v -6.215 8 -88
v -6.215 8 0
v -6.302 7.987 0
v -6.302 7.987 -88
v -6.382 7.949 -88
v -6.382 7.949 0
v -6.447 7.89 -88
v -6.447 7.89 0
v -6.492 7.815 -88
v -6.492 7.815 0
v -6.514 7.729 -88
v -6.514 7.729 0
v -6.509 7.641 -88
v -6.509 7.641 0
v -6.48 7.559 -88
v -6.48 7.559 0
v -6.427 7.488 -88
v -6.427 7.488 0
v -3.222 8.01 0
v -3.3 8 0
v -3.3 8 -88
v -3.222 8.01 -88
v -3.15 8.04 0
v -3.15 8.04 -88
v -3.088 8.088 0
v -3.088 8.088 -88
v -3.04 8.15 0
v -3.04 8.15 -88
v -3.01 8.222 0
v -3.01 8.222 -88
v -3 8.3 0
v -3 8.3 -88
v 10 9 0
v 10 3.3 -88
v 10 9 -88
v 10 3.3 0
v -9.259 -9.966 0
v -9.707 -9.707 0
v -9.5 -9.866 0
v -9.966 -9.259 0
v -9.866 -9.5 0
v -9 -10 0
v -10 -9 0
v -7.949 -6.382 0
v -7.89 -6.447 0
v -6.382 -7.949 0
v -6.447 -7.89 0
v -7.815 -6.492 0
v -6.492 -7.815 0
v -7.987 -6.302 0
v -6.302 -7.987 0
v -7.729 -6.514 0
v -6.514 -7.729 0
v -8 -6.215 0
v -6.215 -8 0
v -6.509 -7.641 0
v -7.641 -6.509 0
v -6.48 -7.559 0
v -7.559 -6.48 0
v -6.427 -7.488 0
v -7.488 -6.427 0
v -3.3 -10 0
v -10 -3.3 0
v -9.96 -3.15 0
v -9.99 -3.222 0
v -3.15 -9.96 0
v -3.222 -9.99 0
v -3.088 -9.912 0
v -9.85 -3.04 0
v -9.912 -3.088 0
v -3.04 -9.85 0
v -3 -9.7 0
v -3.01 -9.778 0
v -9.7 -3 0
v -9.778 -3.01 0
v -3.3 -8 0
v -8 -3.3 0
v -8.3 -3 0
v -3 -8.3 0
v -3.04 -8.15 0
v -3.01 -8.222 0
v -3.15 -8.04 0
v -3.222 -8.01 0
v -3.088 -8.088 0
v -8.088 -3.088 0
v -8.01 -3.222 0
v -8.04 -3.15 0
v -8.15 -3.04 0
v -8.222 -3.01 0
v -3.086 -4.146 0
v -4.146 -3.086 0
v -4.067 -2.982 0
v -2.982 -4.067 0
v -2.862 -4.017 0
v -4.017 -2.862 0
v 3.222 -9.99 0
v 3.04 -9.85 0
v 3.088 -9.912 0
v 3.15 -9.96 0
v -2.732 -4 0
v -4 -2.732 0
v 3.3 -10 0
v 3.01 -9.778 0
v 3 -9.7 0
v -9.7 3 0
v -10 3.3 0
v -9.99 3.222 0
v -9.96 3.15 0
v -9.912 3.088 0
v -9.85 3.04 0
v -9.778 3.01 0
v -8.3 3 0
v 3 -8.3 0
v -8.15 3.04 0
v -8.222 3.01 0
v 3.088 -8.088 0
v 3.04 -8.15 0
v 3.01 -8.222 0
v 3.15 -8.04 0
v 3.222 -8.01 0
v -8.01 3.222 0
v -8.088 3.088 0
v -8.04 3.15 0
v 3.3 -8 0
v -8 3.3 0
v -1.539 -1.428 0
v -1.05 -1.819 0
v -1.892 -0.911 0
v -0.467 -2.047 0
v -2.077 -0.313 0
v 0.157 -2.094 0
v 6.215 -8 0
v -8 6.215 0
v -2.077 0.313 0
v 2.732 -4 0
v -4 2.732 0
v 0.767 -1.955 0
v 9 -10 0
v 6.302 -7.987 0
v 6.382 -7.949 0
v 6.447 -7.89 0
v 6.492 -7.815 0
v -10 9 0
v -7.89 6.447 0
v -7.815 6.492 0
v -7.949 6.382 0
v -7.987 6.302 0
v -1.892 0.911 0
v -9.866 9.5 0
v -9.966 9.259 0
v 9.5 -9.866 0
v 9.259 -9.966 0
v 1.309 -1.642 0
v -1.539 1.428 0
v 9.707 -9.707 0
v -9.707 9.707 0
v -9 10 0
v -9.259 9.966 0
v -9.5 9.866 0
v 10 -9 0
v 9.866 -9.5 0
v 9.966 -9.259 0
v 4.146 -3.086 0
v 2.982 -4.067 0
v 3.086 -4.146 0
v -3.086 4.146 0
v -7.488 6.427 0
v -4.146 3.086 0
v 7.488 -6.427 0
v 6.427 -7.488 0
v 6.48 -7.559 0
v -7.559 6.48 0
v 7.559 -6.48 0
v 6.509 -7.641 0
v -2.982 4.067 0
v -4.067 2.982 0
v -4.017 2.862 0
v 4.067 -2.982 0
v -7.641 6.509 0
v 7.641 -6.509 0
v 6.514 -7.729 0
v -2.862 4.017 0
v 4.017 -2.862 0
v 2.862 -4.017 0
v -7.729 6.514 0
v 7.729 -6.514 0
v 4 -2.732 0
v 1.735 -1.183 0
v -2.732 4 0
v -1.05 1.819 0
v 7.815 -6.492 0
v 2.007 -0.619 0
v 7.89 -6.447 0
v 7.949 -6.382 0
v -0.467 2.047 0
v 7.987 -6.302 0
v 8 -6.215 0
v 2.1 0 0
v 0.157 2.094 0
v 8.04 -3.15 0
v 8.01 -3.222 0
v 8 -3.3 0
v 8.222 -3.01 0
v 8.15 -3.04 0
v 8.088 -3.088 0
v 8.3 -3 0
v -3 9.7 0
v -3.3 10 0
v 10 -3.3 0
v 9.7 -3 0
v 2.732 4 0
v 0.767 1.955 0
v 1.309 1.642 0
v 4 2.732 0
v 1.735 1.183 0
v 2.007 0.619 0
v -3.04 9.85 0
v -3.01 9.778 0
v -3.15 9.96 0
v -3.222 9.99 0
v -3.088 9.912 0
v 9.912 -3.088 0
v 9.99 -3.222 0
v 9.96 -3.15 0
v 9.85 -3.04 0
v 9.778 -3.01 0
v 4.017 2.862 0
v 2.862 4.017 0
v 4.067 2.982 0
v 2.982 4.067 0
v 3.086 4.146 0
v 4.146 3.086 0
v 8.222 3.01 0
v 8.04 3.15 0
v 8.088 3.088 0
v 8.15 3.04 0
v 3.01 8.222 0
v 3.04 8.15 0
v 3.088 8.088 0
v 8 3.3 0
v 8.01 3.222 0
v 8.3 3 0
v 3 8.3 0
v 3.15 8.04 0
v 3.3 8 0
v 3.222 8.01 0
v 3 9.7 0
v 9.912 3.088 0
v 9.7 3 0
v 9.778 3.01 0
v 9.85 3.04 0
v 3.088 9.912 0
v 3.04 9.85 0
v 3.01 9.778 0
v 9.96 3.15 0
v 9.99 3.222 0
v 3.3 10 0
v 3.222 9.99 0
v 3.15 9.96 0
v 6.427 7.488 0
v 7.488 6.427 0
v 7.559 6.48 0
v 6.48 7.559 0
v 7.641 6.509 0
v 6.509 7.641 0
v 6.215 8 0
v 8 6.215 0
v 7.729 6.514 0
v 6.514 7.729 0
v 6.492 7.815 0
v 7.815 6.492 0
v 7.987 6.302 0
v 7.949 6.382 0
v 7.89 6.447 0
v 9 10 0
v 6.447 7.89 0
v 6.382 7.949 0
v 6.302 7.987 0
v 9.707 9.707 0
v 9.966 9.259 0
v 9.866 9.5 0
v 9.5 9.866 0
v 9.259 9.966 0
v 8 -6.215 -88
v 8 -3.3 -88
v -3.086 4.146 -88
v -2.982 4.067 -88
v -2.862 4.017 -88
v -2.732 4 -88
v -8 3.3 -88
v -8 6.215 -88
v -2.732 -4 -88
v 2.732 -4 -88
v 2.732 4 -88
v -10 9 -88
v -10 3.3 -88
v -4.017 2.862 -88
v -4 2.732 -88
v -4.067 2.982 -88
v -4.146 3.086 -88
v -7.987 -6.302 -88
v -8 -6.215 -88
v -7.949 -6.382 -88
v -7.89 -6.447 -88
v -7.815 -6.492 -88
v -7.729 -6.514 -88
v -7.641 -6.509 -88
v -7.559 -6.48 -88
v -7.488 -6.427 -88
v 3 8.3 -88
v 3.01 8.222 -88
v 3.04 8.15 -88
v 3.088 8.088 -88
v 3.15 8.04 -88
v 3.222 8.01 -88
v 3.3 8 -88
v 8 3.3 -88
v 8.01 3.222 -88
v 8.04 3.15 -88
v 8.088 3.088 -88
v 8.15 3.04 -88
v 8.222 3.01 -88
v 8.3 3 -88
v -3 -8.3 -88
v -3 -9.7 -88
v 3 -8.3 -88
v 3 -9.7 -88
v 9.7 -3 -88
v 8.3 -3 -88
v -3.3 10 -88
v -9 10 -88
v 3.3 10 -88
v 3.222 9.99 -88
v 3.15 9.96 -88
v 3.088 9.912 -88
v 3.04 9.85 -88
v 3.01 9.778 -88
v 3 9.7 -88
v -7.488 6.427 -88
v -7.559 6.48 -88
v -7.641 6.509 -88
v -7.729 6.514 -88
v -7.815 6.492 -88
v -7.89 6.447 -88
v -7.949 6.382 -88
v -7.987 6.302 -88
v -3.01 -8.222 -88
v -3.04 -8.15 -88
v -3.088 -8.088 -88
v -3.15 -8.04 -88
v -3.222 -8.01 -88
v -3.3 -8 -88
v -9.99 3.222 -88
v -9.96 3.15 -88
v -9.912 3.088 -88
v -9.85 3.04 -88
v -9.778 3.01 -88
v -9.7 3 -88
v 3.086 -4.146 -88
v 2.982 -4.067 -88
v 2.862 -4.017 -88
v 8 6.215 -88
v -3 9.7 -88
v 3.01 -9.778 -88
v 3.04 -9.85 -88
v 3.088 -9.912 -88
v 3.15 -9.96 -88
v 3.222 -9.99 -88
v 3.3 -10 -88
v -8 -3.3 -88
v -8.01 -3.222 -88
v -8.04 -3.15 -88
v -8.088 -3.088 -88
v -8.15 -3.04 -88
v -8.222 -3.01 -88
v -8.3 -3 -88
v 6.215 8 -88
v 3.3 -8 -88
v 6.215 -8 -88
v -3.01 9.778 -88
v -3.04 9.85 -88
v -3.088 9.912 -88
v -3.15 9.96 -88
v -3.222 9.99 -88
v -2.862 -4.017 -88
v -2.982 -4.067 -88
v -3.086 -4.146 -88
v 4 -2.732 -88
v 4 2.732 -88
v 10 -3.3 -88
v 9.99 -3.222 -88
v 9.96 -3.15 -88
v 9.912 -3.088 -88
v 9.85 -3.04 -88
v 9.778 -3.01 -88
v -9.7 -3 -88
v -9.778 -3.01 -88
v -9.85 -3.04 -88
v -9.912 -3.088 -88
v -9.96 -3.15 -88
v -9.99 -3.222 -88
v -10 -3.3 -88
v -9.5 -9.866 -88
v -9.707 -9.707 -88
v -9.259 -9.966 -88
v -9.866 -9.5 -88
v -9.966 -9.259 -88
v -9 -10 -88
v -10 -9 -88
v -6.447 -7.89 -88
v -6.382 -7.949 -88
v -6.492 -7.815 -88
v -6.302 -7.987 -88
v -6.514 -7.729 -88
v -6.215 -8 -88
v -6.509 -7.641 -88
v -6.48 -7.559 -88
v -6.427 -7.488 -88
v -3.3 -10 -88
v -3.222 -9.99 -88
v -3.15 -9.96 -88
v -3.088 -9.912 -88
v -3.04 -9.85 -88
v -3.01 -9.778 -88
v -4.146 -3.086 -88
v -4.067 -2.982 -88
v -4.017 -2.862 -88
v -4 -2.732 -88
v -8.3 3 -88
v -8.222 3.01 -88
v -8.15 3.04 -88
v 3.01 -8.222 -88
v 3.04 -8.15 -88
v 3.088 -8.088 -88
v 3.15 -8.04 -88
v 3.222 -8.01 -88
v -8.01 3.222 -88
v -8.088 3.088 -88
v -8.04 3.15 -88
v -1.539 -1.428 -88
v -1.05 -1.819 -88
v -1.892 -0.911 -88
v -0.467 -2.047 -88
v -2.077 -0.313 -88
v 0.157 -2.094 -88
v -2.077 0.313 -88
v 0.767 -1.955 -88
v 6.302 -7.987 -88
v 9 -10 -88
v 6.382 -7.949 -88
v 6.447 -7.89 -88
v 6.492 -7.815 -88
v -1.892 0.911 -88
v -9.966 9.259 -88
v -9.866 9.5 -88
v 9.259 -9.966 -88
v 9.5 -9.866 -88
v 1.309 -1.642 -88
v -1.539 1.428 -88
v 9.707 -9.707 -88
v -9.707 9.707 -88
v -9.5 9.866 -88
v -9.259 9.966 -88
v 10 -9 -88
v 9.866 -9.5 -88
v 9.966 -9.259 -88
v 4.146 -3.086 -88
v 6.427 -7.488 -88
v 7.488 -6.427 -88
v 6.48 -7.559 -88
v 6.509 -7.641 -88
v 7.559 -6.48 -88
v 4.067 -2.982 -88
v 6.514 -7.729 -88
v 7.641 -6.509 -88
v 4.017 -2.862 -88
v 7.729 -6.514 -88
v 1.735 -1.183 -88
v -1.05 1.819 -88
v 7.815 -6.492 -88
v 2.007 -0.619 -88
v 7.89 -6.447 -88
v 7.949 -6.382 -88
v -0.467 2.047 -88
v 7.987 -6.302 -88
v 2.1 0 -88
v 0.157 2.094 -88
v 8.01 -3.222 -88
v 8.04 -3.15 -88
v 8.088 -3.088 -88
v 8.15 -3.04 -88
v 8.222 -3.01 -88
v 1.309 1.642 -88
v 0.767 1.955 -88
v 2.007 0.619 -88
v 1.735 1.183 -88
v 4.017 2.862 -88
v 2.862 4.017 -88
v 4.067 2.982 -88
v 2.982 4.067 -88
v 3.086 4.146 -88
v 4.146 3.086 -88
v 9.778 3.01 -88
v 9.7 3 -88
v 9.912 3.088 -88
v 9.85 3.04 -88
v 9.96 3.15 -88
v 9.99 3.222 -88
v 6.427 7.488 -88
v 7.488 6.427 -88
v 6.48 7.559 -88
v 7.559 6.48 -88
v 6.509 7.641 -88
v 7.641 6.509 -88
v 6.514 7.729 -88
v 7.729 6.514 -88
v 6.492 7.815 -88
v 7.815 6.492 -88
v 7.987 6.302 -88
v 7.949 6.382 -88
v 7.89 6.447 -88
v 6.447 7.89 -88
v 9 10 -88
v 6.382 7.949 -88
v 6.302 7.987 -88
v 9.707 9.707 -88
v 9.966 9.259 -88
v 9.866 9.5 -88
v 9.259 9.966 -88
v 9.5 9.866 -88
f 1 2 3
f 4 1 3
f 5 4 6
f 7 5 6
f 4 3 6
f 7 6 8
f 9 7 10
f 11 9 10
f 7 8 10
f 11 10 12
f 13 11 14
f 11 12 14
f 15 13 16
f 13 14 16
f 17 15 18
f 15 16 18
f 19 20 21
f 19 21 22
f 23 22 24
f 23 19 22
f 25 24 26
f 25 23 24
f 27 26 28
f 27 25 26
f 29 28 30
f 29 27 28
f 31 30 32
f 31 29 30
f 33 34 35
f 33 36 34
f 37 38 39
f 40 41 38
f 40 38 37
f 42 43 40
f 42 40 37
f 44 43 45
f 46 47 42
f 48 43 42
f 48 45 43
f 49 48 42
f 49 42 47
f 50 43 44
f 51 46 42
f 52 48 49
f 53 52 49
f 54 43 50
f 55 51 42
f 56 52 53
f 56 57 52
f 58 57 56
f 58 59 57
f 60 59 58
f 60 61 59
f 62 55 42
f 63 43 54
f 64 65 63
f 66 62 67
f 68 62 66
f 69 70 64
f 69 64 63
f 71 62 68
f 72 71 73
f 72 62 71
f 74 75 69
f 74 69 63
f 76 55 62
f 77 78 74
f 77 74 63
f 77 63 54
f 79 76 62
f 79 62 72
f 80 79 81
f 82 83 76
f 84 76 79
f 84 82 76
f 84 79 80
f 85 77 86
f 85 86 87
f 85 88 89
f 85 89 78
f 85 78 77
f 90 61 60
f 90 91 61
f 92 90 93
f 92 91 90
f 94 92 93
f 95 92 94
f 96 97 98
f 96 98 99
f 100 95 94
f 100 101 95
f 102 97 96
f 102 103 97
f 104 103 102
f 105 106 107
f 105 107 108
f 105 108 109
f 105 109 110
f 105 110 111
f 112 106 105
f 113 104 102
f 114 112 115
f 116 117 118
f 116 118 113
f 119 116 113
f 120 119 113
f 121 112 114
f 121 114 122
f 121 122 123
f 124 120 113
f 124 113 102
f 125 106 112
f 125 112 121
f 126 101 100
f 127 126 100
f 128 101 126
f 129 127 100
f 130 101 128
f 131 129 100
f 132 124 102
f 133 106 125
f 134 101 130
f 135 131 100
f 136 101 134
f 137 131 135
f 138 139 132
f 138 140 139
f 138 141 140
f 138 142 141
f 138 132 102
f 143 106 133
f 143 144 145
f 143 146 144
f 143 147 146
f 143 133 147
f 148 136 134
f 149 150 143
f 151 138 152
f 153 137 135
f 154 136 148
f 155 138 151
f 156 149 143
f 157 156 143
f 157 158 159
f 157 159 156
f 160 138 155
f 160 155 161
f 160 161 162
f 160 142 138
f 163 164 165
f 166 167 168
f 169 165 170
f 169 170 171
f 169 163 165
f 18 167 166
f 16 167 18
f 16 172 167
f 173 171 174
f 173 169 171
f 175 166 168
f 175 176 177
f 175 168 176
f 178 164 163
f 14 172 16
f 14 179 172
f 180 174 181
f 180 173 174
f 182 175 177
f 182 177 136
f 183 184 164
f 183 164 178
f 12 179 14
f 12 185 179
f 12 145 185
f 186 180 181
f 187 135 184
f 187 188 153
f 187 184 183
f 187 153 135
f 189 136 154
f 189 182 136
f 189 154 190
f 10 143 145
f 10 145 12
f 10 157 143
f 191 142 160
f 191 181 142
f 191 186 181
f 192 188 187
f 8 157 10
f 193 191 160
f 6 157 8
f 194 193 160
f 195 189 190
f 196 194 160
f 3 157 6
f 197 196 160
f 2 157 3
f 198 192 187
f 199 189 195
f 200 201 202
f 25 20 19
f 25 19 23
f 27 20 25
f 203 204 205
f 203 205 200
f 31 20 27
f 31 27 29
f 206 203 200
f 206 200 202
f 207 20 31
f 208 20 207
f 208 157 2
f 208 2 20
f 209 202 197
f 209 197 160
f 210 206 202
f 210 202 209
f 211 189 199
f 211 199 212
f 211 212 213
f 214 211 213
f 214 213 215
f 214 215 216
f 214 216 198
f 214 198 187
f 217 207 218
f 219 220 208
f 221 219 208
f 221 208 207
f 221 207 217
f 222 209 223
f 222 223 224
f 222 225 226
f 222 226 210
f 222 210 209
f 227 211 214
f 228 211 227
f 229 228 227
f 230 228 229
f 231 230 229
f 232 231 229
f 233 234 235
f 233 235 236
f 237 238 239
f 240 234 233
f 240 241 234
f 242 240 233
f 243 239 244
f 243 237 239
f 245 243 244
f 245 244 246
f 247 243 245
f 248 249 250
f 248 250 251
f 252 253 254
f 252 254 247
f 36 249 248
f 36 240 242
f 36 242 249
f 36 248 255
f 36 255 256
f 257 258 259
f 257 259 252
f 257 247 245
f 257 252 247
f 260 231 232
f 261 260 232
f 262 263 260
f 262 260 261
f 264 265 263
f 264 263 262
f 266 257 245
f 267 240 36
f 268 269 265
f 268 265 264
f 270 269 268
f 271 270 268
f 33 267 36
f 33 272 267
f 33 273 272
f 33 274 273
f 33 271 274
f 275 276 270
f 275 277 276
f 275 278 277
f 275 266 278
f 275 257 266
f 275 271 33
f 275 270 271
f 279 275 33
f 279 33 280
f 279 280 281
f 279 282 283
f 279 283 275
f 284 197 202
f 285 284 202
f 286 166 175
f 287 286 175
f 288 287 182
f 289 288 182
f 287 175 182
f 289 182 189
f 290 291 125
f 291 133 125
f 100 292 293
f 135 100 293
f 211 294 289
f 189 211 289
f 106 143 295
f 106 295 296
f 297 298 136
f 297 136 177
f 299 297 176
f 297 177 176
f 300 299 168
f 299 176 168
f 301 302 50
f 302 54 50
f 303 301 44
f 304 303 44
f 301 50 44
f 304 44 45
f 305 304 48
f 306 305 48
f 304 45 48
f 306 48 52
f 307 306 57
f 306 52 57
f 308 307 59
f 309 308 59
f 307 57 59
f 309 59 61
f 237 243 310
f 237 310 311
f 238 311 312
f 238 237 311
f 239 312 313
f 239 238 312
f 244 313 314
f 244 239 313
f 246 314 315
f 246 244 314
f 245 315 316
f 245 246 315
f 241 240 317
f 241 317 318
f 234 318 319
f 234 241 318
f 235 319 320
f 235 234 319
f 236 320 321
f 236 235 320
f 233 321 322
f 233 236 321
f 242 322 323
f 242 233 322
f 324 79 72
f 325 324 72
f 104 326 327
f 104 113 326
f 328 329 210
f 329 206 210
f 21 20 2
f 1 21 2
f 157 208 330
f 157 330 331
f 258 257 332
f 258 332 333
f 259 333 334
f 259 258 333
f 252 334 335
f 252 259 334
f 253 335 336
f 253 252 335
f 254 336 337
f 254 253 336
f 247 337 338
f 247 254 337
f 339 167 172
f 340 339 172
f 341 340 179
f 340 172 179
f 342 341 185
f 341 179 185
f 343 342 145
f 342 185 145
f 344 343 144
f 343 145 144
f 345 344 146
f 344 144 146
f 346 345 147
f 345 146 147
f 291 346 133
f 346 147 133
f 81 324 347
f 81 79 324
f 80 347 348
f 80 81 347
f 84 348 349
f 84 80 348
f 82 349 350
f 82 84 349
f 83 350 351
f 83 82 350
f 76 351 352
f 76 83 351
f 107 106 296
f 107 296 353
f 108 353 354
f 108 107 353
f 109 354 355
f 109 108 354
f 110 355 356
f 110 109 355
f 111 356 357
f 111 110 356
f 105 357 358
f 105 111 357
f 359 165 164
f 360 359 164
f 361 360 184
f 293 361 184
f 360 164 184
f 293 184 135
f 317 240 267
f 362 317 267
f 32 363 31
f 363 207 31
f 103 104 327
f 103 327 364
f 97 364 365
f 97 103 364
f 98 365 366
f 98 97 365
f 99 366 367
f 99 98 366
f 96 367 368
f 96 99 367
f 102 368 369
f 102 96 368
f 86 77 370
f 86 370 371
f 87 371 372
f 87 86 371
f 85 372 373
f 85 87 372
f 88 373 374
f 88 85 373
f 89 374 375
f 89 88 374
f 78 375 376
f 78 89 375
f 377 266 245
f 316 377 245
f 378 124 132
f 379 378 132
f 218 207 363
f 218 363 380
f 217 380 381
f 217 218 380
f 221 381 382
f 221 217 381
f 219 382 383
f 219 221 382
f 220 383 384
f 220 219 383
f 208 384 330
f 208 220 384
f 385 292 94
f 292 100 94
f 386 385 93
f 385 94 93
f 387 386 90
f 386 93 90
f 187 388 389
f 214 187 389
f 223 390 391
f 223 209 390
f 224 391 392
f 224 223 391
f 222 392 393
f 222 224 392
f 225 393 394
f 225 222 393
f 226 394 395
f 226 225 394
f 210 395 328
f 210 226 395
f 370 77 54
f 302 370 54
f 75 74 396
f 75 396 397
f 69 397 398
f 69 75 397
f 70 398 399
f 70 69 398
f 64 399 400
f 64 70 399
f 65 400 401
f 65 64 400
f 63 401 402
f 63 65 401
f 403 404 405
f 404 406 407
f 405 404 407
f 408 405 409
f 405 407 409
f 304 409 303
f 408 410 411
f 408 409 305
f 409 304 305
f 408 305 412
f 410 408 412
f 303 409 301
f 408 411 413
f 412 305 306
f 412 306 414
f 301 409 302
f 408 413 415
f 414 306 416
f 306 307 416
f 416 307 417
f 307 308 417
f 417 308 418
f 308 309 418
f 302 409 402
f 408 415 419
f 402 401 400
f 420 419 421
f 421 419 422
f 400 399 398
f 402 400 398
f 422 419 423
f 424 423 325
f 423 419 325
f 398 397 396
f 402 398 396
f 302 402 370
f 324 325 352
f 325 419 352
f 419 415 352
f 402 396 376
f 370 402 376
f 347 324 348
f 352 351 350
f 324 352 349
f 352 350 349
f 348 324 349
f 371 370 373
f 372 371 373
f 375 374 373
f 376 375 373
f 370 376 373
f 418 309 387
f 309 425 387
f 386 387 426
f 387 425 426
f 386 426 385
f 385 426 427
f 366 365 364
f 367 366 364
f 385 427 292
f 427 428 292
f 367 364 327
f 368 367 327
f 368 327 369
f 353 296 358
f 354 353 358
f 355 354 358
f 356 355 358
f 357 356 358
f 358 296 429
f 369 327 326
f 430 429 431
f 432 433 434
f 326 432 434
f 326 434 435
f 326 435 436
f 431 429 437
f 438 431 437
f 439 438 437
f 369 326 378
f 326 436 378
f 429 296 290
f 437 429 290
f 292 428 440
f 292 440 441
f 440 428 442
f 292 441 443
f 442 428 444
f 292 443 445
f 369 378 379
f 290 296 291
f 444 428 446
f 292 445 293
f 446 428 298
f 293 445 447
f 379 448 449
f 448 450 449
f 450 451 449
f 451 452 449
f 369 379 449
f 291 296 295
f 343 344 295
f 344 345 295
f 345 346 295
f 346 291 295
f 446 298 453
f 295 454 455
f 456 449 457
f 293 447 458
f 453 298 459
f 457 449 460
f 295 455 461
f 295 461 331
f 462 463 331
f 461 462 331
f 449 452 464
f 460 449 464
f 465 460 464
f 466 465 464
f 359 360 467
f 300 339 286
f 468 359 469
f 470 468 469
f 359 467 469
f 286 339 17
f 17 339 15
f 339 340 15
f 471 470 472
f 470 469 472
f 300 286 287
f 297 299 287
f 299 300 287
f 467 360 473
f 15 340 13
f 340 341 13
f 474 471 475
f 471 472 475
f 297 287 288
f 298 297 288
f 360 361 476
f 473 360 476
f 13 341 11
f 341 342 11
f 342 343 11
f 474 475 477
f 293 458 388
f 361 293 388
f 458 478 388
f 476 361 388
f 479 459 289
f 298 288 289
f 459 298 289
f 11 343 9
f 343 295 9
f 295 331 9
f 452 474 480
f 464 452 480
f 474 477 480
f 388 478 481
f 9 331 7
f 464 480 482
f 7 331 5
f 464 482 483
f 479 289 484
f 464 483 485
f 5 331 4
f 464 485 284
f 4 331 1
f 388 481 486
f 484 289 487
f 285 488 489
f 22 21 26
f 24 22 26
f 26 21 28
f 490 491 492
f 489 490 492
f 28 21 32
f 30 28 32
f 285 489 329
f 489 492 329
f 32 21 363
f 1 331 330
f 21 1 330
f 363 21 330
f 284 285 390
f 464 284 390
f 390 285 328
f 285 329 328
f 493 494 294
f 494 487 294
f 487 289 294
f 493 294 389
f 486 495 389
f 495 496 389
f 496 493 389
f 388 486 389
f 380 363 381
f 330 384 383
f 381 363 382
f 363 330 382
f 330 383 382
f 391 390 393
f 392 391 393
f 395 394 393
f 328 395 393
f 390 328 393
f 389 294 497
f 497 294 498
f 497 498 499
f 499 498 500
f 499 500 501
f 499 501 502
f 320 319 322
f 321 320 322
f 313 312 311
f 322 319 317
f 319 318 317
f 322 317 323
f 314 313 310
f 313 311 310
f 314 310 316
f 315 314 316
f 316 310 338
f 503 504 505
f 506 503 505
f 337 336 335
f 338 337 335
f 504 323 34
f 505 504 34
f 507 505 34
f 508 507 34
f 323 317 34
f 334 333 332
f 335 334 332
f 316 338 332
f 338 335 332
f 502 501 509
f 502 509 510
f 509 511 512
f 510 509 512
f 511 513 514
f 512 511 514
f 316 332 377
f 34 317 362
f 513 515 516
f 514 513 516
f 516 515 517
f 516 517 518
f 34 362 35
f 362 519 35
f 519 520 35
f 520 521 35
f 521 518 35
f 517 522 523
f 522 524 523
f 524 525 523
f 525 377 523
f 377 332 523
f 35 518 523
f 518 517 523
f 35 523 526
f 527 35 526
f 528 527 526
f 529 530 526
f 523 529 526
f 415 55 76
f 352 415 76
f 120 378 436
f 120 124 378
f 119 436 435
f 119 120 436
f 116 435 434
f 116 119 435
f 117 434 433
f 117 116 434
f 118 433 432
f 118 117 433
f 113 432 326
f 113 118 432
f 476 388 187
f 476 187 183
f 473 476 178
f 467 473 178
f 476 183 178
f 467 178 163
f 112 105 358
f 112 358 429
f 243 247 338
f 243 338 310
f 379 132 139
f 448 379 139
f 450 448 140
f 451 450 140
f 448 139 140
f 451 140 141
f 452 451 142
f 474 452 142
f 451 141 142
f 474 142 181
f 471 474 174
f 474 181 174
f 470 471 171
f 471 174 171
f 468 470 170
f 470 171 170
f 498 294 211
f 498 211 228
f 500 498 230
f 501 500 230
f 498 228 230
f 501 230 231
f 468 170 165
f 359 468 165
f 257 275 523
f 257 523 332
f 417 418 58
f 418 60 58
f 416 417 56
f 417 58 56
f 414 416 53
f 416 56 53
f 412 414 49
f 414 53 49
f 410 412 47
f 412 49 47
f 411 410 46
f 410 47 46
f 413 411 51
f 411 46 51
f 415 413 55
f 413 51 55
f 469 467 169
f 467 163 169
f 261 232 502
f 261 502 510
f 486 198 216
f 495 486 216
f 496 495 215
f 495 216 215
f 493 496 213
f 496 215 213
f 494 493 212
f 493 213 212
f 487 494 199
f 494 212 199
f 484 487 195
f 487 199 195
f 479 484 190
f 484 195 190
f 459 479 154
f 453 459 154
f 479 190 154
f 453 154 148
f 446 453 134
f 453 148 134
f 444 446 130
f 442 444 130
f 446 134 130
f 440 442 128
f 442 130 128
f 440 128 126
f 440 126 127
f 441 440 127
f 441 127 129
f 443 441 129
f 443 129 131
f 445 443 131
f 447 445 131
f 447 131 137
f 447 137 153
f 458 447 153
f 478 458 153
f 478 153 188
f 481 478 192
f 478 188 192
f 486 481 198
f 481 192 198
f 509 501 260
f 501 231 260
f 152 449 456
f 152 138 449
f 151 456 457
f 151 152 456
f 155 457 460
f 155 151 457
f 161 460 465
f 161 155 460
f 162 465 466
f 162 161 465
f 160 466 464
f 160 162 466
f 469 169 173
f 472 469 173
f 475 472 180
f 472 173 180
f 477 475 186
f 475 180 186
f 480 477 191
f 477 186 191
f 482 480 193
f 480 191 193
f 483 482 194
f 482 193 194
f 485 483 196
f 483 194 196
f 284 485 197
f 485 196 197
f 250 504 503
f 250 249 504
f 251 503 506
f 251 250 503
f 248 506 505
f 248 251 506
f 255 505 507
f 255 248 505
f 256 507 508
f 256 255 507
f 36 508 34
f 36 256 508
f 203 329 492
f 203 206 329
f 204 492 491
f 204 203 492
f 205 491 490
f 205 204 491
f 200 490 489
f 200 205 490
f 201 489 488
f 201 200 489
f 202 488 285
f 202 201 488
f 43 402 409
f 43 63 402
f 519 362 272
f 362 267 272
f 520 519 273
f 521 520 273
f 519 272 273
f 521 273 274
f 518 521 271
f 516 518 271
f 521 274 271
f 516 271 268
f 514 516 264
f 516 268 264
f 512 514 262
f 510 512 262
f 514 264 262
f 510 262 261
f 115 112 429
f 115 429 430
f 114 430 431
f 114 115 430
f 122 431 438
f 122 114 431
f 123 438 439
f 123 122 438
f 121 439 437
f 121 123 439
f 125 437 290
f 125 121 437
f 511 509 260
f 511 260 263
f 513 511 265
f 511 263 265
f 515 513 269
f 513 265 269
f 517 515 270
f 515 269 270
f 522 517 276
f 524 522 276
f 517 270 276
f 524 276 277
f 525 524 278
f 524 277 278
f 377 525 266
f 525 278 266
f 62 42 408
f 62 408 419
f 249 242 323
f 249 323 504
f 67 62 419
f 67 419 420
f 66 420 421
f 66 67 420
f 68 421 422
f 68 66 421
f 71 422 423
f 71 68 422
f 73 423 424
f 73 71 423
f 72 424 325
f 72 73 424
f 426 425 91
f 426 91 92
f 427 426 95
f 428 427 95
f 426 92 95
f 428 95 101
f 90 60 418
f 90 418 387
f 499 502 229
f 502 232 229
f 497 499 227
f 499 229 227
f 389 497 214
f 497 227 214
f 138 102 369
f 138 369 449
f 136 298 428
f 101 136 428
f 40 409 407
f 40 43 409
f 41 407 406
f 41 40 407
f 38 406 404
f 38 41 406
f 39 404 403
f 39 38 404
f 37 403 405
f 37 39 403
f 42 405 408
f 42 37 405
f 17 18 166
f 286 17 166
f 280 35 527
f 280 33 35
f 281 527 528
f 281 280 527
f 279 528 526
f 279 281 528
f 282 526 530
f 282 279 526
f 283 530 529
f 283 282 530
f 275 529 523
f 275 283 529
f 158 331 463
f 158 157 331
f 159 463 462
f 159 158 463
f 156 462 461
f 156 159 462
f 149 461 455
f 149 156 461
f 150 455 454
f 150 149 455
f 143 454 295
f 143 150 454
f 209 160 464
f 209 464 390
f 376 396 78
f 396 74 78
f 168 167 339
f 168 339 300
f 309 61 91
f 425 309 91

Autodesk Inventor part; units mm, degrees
ref_plane "YZ Plane" through (0, 0, 0) normal (1, 0, 0) x (0, 1, 0)
ref_plane "XZ Plane" through (0, 0, 0) normal (0, 1, 0) x (-1, 0, 0)
ref_plane "XY Plane" through (0, 0, 0) normal (0, 0, 1) x (1, 0, 0)
sketch "Skizze1" plane through (0, 0, 0) normal (0, 0, 1) x (1, 0, 0)
  line L0 (-20.0059, 0) -> (20.0059, 0) projected
  line L1 (0, -20.0059) -> (0, 20.0059) projected
  line L2 (-14.2899, 0) -> (14.2899, 0)
  line L3 (0, -14.2899) -> (0, 14.2899)
  line L4 (-10, -10) -> (10, 10) construction
  line L5 (10, -10) -> (-10, 10) construction
  line L6 (-8, -8) -> (8, 8) construction
  line L7 (8, -8) -> (-8, 8) construction
  line L8 (-2.7322, -4) -> (2.7322, -4)
  line L9 (4, -2.7322) -> (4, 2.7322)
  line L10 (2.7322, 4) -> (-2.7322, 4)
  line L11 (-4, 2.7322) -> (-4, -2.7322)
  line L12 (-4, -4) -> (4, 4) construction
  line L13 (4, -4) -> (-4, 4) construction
  arc A0 (-9, 10) -> (-10, 9) centre (-9, 9) ccw
  arc A1 (10, 9) -> (9, 10) centre (9, 9) ccw
  arc A2 (9, -10) -> (10, -9) centre (9, -9) ccw
  arc A3 (-10, -9) -> (-9, -10) centre (-9, -9) ccw
  line L14 (-3, 9.7) -> (-3, 8.3)
  line L15 (3, 9.7) -> (3, 8.3)
  line L16 (6.2151, 8) -> (3.3, 8)
  line L17 (-3.3, 8) -> (-6.2151, 8)
  line L18 (9, 10) -> (3.3, 10)
  line L19 (-3.3, 10) -> (-9, 10)
  line L20 (-9.7, -3) -> (-8.3, -3)
  line L21 (-9.7, 3) -> (-8.3, 3)
  line L22 (-8, 6.2151) -> (-8, 3.3)
  line L23 (-8, -3.3) -> (-8, -6.2151)
  line L24 (-10, 9) -> (-10, 3.3)
  line L25 (-10, -3.3) -> (-10, -9)
  line L26 (-3, -8.3) -> (-3, -9.7)
  line L27 (3, -8.3) -> (3, -9.7)
  line L28 (-9, -10) -> (-3.3, -10)
  line L29 (3.3, -10) -> (9, -10)
  line L30 (-6.2151, -8) -> (-3.3, -8)
  line L31 (3.3, -8) -> (6.2151, -8)
  line L32 (8.3, 3) -> (9.7, 3)
  line L33 (8.3, -3) -> (9.7, -3)
  line L34 (8, -6.2151) -> (8, -3.3)
  line L35 (8, 3.3) -> (8, 6.2151)
  line L36 (10, -9) -> (10, -3.3)
  line L37 (10, 3.3) -> (10, 9)
  arc A4 (-10, 3.3) -> (-9.7, 3) centre (-9.7, 3.3) ccw
  arc A5 (-8.3, 3) -> (-8, 3.3) centre (-8.3, 3.3) ccw
  arc A6 (-9.7, -3) -> (-10, -3.3) centre (-9.7, -3.3) ccw
  arc A7 (-8, -3.3) -> (-8.3, -3) centre (-8.3, -3.3) ccw
  arc A8 (-3.3, -10) -> (-3, -9.7) centre (-3.3, -9.7) ccw
  arc A9 (-3, -8.3) -> (-3.3, -8) centre (-3.3, -8.3) ccw
  arc A10 (3, -9.7) -> (3.3, -10) centre (3.3, -9.7) ccw
  arc A11 (3.3, -8) -> (3, -8.3) centre (3.3, -8.3) ccw
  arc A12 (8.3, -3) -> (8, -3.3) centre (8.3, -3.3) ccw
  arc A13 (10, -3.3) -> (9.7, -3) centre (9.7, -3.3) ccw
  arc A14 (8, 3.3) -> (8.3, 3) centre (8.3, 3.3) ccw
  arc A15 (9.7, 3) -> (10, 3.3) centre (9.7, 3.3) ccw
  arc A16 (3, 8.3) -> (3.3, 8) centre (3.3, 8.3) ccw
  arc A17 (3.3, 10) -> (3, 9.7) centre (3.3, 9.7) ccw
  arc A18 (-3.3, 8) -> (-3, 8.3) centre (-3.3, 8.3) ccw
  arc A19 (-3, 9.7) -> (-3.3, 10) centre (-3.3, 9.7) ccw
  line L38 (-7.4879, 6.4272) -> (-4.1464, 3.0858)
  line L39 (-6.4272, 7.4879) -> (-3.0858, 4.1464)
  line L40 (-6.4272, -7.4879) -> (-3.0858, -4.1464)
  line L41 (-7.4879, -6.4272) -> (-4.1464, -3.0858)
  arc A20 (-7.4879, 6.4272) -> (-8, 6.2151) centre (-7.7, 6.2151) ccw
  arc A21 (-6.2151, 8) -> (-6.4272, 7.4879) centre (-6.2151, 7.7) ccw
  arc A22 (-8, -6.2151) -> (-7.4879, -6.4272) centre (-7.7, -6.2151) ccw
  arc A23 (-6.4272, -7.4879) -> (-6.2151, -8) centre (-6.2151, -7.7) ccw
  line L42 (6.4272, -7.4879) -> (3.0858, -4.1464)
  line L43 (4.1464, -3.0858) -> (7.4879, -6.4272)
  arc A24 (6.2151, -8) -> (6.4272, -7.4879) centre (6.2151, -7.7) ccw
  arc A25 (7.4879, -6.4272) -> (8, -6.2151) centre (7.7, -6.2151) ccw
  line L44 (4.1464, 3.0858) -> (7.4879, 6.4272)
  line L45 (3.0858, 4.1464) -> (6.4272, 7.4879)
  arc A26 (6.4272, 7.4879) -> (6.2151, 8) centre (6.2151, 7.7) ccw
  arc A27 (8, 6.2151) -> (7.4879, 6.4272) centre (7.7, 6.2151) ccw
  arc A28 (-3.0858, 4.1464) -> (-2.7322, 4) centre (-2.7322, 4.5) ccw
  arc A29 (-4, 2.7322) -> (-4.1464, 3.0858) centre (-4.5, 2.7322) ccw
  arc A30 (2.7322, 4) -> (3.0858, 4.1464) centre (2.7322, 4.5) ccw
  arc A31 (4.1464, 3.0858) -> (4, 2.7322) centre (4.5, 2.7322) ccw
  arc A32 (-4.1464, -3.0858) -> (-4, -2.7322) centre (-4.5, -2.7322) ccw
  arc A33 (-2.7322, -4) -> (-3.0858, -4.1464) centre (-2.7322, -4.5) ccw
  arc A34 (3.0858, -4.1464) -> (2.7322, -4) centre (2.7322, -4.5) ccw
  arc A35 (4, -2.7322) -> (4.1464, -3.0858) centre (4.5, -2.7322) ccw
  circle A36 centre (0, 0) radius 2.1
  point P0 (3, 8.9014)
  point P1 (-3, 9.1415)
  point P2 (-8.9764, -3)
  point P3 (-9.1265, 3)
  point P4 (3, -9.1251)
  point P5 (-3, -9.1251)
  point P6 (9.1101, -3)
  point P7 (9.1101, 3)
  dimension "d0" = 20
  dimension "d1" = 20
  dimension "d2" = 16
  dimension "d3" = 16
  dimension "d4" = 8
  dimension "d5" = 8
  dimension "d6" = 1
  dimension "d7" = 6
  dimension "d8" = 6
  dimension "d9" = 6
  dimension "d10" = 6
  dimension "d11" = 0.3
  dimension "d12" = 1.5
  dimension "d13" = 1.5
  dimension "d14" = 0.3
  dimension "d15" = 1.5
  dimension "d16" = 0.3
  dimension "d17" = 1.5
  dimension "d18" = 0.3
  dimension "d19" = 0.5
  dimension "d20" = 4.2
  dimension "d21" = 45
  dimension "d22" = 10
  dimension "d23" = 10
  dimension "d24" = 4
  dimension "d25" = 4
  dimension "d26" = 10
  dimension "d27" = 8
  dimension "d28" = 4
  dimension "d29" = 4
  dimension "d30" = 10
  dimension "d31" = 9.1101
  dimension "d32" = 8
  dimension "d33" = 4
  dimension "d34" = 8.9014
  dimension "d35" = 9.1251
  dimension "d36" = 9.1415
  dimension "d37" = 8.9764
  dimension "d38" = 9.1265
extrude "Extrusion1" add sketch "Skizze1" against normal blind 88
sketch "Skizze2" plane through (0, 0, 0) normal (0, 0, 1) x (1, 0, 0)
  arc A0 (-4.1464, -3.0858) -> (-4, -2.7322) centre (-4.5, -2.7322) ccw projected
  line L0 (-4.1464, -3.0858) -> (-7.4879, -6.4272) projected
  arc A1 (-8, -6.2151) -> (-7.4879, -6.4272) centre (-7.7, -6.2151) ccw projected
  line L1 (-8, -6.2151) -> (-8, -3.3) projected
  arc A2 (-8, -3.3) -> (-8.3, -3) centre (-8.3, -3.3) ccw projected
  line L2 (-8.3, -3) -> (-9.7, -3) projected
  arc A3 (-9.7, -3) -> (-10, -3.3) centre (-9.7, -3.3) ccw projected
  line L3 (-10, -3.3) -> (-10, -9) projected
  arc A4 (-10, -9) -> (-9, -10) centre (-9, -9) ccw projected
  line L4 (-9, -10) -> (-3.3, -10) projected
  arc A5 (-3.3, -10) -> (-3, -9.7) centre (-3.3, -9.7) ccw projected
  line L5 (-3, -9.7) -> (-3, -8.3) projected
  arc A6 (-3, -8.3) -> (-3.3, -8) centre (-3.3, -8.3) ccw projected
  line L6 (-3.3, -8) -> (-6.2151, -8) projected
  arc A7 (-6.4272, -7.4879) -> (-6.2151, -8) centre (-6.2151, -7.7) ccw projected
  line L7 (-6.4272, -7.4879) -> (-3.0858, -4.1464) projected
  arc A8 (-2.7322, -4) -> (-3.0858, -4.1464) centre (-2.7322, -4.5) ccw projected
  line L8 (-2.7322, -4) -> (2.7322, -4) projected
  arc A9 (3.0858, -4.1464) -> (2.7322, -4) centre (2.7322, -4.5) ccw projected
  line L9 (3.0858, -4.1464) -> (6.4272, -7.4879) projected
  arc A10 (6.2151, -8) -> (6.4272, -7.4879) centre (6.2151, -7.7) ccw projected
  line L10 (6.2151, -8) -> (3.3, -8) projected
  arc A11 (3.3, -8) -> (3, -8.3) centre (3.3, -8.3) ccw projected
  line L11 (3, -8.3) -> (3, -9.7) projected
  arc A12 (3, -9.7) -> (3.3, -10) centre (3.3, -9.7) ccw projected
  line L12 (3.3, -10) -> (9, -10) projected
  arc A13 (9, -10) -> (10, -9) centre (9, -9) ccw projected
  line L13 (10, -9) -> (10, -3.3) projected
  arc A14 (10, -3.3) -> (9.7, -3) centre (9.7, -3.3) ccw projected
  line L14 (9.7, -3) -> (8.3, -3) projected
  arc A15 (8.3, -3) -> (8, -3.3) centre (8.3, -3.3) ccw projected
  line L15 (8, -3.3) -> (8, -6.2151) projected
  arc A16 (7.4879, -6.4272) -> (8, -6.2151) centre (7.7, -6.2151) ccw projected
  line L16 (7.4879, -6.4272) -> (4.1464, -3.0858) projected
  arc A17 (4, -2.7322) -> (4.1464, -3.0858) centre (4.5, -2.7322) ccw projected
  line L17 (4, -2.7322) -> (4, 2.7322) projected
  arc A18 (4.1464, 3.0858) -> (4, 2.7322) centre (4.5, 2.7322) ccw projected
  line L18 (4.1464, 3.0858) -> (7.4879, 6.4272) projected
  arc A19 (8, 6.2151) -> (7.4879, 6.4272) centre (7.7, 6.2151) ccw projected
  line L19 (8, 6.2151) -> (8, 3.3) projected
  arc A20 (8, 3.3) -> (8.3, 3) centre (8.3, 3.3) ccw projected
  line L20 (8.3, 3) -> (9.7, 3) projected
  arc A21 (9.7, 3) -> (10, 3.3) centre (9.7, 3.3) ccw projected
  line L21 (10, 3.3) -> (10, 9) projected
  arc A22 (10, 9) -> (9, 10) centre (9, 9) ccw projected
  line L22 (9, 10) -> (3.3, 10) projected
  arc A23 (3.3, 10) -> (3, 9.7) centre (3.3, 9.7) ccw projected
  line L23 (3, 9.7) -> (3, 8.3) projected
  arc A24 (3, 8.3) -> (3.3, 8) centre (3.3, 8.3) ccw projected
  line L24 (3.3, 8) -> (6.2151, 8) projected
  arc A25 (6.4272, 7.4879) -> (6.2151, 8) centre (6.2151, 7.7) ccw projected
  line L25 (6.4272, 7.4879) -> (3.0858, 4.1464) projected
  arc A26 (2.7322, 4) -> (3.0858, 4.1464) centre (2.7322, 4.5) ccw projected
  line L26 (2.7322, 4) -> (-2.7322, 4) projected
  arc A27 (-3.0858, 4.1464) -> (-2.7322, 4) centre (-2.7322, 4.5) ccw projected
  line L27 (-3.0858, 4.1464) -> (-6.4272, 7.4879) projected
  arc A28 (-6.2151, 8) -> (-6.4272, 7.4879) centre (-6.2151, 7.7) ccw projected
  line L28 (-6.2151, 8) -> (-3.3, 8) projected
  arc A29 (-3.3, 8) -> (-3, 8.3) centre (-3.3, 8.3) ccw projected
  line L29 (-3, 8.3) -> (-3, 9.7) projected
  arc A30 (-3, 9.7) -> (-3.3, 10) centre (-3.3, 9.7) ccw projected
  line L30 (-3.3, 10) -> (-9, 10) projected
  arc A31 (-9, 10) -> (-10, 9) centre (-9, 9) ccw projected
  line L31 (-10, 9) -> (-10, 3.3) projected
  arc A32 (-10, 3.3) -> (-9.7, 3) centre (-9.7, 3.3) ccw projected
  line L32 (-9.7, 3) -> (-8.3, 3) projected
  arc A33 (-8.3, 3) -> (-8, 3.3) centre (-8.3, 3.3) ccw projected
  line L33 (-8, 3.3) -> (-8, 6.2151) projected
  arc A34 (-7.4879, 6.4272) -> (-8, 6.2151) centre (-7.7, 6.2151) ccw projected
  line L34 (-7.4879, 6.4272) -> (-4.1464, 3.0858) projected
  arc A35 (-4, 2.7322) -> (-4.1464, 3.0858) centre (-4.5, 2.7322) ccw projected
  line L35 (-4, 2.7322) -> (-4, -2.7322) projected
  line L36 (-14.2899, 0) -> (14.2899, 0) projected
  line L37 (0, -14.2899) -> (0, 14.2899) projected
  circle A36 centre (0, 0) radius 2.1
  dimension "d41" = 4.2
extrude "Extrusion2" cut sketch "Skizze2" against normal blind 88 contours A36 L37 L36 | L36 L37 A36 | L37 A36 L36 | L36 A36 L37
properties part number "I Strebe waagrecht kurz" material "Aluminium 6061"
